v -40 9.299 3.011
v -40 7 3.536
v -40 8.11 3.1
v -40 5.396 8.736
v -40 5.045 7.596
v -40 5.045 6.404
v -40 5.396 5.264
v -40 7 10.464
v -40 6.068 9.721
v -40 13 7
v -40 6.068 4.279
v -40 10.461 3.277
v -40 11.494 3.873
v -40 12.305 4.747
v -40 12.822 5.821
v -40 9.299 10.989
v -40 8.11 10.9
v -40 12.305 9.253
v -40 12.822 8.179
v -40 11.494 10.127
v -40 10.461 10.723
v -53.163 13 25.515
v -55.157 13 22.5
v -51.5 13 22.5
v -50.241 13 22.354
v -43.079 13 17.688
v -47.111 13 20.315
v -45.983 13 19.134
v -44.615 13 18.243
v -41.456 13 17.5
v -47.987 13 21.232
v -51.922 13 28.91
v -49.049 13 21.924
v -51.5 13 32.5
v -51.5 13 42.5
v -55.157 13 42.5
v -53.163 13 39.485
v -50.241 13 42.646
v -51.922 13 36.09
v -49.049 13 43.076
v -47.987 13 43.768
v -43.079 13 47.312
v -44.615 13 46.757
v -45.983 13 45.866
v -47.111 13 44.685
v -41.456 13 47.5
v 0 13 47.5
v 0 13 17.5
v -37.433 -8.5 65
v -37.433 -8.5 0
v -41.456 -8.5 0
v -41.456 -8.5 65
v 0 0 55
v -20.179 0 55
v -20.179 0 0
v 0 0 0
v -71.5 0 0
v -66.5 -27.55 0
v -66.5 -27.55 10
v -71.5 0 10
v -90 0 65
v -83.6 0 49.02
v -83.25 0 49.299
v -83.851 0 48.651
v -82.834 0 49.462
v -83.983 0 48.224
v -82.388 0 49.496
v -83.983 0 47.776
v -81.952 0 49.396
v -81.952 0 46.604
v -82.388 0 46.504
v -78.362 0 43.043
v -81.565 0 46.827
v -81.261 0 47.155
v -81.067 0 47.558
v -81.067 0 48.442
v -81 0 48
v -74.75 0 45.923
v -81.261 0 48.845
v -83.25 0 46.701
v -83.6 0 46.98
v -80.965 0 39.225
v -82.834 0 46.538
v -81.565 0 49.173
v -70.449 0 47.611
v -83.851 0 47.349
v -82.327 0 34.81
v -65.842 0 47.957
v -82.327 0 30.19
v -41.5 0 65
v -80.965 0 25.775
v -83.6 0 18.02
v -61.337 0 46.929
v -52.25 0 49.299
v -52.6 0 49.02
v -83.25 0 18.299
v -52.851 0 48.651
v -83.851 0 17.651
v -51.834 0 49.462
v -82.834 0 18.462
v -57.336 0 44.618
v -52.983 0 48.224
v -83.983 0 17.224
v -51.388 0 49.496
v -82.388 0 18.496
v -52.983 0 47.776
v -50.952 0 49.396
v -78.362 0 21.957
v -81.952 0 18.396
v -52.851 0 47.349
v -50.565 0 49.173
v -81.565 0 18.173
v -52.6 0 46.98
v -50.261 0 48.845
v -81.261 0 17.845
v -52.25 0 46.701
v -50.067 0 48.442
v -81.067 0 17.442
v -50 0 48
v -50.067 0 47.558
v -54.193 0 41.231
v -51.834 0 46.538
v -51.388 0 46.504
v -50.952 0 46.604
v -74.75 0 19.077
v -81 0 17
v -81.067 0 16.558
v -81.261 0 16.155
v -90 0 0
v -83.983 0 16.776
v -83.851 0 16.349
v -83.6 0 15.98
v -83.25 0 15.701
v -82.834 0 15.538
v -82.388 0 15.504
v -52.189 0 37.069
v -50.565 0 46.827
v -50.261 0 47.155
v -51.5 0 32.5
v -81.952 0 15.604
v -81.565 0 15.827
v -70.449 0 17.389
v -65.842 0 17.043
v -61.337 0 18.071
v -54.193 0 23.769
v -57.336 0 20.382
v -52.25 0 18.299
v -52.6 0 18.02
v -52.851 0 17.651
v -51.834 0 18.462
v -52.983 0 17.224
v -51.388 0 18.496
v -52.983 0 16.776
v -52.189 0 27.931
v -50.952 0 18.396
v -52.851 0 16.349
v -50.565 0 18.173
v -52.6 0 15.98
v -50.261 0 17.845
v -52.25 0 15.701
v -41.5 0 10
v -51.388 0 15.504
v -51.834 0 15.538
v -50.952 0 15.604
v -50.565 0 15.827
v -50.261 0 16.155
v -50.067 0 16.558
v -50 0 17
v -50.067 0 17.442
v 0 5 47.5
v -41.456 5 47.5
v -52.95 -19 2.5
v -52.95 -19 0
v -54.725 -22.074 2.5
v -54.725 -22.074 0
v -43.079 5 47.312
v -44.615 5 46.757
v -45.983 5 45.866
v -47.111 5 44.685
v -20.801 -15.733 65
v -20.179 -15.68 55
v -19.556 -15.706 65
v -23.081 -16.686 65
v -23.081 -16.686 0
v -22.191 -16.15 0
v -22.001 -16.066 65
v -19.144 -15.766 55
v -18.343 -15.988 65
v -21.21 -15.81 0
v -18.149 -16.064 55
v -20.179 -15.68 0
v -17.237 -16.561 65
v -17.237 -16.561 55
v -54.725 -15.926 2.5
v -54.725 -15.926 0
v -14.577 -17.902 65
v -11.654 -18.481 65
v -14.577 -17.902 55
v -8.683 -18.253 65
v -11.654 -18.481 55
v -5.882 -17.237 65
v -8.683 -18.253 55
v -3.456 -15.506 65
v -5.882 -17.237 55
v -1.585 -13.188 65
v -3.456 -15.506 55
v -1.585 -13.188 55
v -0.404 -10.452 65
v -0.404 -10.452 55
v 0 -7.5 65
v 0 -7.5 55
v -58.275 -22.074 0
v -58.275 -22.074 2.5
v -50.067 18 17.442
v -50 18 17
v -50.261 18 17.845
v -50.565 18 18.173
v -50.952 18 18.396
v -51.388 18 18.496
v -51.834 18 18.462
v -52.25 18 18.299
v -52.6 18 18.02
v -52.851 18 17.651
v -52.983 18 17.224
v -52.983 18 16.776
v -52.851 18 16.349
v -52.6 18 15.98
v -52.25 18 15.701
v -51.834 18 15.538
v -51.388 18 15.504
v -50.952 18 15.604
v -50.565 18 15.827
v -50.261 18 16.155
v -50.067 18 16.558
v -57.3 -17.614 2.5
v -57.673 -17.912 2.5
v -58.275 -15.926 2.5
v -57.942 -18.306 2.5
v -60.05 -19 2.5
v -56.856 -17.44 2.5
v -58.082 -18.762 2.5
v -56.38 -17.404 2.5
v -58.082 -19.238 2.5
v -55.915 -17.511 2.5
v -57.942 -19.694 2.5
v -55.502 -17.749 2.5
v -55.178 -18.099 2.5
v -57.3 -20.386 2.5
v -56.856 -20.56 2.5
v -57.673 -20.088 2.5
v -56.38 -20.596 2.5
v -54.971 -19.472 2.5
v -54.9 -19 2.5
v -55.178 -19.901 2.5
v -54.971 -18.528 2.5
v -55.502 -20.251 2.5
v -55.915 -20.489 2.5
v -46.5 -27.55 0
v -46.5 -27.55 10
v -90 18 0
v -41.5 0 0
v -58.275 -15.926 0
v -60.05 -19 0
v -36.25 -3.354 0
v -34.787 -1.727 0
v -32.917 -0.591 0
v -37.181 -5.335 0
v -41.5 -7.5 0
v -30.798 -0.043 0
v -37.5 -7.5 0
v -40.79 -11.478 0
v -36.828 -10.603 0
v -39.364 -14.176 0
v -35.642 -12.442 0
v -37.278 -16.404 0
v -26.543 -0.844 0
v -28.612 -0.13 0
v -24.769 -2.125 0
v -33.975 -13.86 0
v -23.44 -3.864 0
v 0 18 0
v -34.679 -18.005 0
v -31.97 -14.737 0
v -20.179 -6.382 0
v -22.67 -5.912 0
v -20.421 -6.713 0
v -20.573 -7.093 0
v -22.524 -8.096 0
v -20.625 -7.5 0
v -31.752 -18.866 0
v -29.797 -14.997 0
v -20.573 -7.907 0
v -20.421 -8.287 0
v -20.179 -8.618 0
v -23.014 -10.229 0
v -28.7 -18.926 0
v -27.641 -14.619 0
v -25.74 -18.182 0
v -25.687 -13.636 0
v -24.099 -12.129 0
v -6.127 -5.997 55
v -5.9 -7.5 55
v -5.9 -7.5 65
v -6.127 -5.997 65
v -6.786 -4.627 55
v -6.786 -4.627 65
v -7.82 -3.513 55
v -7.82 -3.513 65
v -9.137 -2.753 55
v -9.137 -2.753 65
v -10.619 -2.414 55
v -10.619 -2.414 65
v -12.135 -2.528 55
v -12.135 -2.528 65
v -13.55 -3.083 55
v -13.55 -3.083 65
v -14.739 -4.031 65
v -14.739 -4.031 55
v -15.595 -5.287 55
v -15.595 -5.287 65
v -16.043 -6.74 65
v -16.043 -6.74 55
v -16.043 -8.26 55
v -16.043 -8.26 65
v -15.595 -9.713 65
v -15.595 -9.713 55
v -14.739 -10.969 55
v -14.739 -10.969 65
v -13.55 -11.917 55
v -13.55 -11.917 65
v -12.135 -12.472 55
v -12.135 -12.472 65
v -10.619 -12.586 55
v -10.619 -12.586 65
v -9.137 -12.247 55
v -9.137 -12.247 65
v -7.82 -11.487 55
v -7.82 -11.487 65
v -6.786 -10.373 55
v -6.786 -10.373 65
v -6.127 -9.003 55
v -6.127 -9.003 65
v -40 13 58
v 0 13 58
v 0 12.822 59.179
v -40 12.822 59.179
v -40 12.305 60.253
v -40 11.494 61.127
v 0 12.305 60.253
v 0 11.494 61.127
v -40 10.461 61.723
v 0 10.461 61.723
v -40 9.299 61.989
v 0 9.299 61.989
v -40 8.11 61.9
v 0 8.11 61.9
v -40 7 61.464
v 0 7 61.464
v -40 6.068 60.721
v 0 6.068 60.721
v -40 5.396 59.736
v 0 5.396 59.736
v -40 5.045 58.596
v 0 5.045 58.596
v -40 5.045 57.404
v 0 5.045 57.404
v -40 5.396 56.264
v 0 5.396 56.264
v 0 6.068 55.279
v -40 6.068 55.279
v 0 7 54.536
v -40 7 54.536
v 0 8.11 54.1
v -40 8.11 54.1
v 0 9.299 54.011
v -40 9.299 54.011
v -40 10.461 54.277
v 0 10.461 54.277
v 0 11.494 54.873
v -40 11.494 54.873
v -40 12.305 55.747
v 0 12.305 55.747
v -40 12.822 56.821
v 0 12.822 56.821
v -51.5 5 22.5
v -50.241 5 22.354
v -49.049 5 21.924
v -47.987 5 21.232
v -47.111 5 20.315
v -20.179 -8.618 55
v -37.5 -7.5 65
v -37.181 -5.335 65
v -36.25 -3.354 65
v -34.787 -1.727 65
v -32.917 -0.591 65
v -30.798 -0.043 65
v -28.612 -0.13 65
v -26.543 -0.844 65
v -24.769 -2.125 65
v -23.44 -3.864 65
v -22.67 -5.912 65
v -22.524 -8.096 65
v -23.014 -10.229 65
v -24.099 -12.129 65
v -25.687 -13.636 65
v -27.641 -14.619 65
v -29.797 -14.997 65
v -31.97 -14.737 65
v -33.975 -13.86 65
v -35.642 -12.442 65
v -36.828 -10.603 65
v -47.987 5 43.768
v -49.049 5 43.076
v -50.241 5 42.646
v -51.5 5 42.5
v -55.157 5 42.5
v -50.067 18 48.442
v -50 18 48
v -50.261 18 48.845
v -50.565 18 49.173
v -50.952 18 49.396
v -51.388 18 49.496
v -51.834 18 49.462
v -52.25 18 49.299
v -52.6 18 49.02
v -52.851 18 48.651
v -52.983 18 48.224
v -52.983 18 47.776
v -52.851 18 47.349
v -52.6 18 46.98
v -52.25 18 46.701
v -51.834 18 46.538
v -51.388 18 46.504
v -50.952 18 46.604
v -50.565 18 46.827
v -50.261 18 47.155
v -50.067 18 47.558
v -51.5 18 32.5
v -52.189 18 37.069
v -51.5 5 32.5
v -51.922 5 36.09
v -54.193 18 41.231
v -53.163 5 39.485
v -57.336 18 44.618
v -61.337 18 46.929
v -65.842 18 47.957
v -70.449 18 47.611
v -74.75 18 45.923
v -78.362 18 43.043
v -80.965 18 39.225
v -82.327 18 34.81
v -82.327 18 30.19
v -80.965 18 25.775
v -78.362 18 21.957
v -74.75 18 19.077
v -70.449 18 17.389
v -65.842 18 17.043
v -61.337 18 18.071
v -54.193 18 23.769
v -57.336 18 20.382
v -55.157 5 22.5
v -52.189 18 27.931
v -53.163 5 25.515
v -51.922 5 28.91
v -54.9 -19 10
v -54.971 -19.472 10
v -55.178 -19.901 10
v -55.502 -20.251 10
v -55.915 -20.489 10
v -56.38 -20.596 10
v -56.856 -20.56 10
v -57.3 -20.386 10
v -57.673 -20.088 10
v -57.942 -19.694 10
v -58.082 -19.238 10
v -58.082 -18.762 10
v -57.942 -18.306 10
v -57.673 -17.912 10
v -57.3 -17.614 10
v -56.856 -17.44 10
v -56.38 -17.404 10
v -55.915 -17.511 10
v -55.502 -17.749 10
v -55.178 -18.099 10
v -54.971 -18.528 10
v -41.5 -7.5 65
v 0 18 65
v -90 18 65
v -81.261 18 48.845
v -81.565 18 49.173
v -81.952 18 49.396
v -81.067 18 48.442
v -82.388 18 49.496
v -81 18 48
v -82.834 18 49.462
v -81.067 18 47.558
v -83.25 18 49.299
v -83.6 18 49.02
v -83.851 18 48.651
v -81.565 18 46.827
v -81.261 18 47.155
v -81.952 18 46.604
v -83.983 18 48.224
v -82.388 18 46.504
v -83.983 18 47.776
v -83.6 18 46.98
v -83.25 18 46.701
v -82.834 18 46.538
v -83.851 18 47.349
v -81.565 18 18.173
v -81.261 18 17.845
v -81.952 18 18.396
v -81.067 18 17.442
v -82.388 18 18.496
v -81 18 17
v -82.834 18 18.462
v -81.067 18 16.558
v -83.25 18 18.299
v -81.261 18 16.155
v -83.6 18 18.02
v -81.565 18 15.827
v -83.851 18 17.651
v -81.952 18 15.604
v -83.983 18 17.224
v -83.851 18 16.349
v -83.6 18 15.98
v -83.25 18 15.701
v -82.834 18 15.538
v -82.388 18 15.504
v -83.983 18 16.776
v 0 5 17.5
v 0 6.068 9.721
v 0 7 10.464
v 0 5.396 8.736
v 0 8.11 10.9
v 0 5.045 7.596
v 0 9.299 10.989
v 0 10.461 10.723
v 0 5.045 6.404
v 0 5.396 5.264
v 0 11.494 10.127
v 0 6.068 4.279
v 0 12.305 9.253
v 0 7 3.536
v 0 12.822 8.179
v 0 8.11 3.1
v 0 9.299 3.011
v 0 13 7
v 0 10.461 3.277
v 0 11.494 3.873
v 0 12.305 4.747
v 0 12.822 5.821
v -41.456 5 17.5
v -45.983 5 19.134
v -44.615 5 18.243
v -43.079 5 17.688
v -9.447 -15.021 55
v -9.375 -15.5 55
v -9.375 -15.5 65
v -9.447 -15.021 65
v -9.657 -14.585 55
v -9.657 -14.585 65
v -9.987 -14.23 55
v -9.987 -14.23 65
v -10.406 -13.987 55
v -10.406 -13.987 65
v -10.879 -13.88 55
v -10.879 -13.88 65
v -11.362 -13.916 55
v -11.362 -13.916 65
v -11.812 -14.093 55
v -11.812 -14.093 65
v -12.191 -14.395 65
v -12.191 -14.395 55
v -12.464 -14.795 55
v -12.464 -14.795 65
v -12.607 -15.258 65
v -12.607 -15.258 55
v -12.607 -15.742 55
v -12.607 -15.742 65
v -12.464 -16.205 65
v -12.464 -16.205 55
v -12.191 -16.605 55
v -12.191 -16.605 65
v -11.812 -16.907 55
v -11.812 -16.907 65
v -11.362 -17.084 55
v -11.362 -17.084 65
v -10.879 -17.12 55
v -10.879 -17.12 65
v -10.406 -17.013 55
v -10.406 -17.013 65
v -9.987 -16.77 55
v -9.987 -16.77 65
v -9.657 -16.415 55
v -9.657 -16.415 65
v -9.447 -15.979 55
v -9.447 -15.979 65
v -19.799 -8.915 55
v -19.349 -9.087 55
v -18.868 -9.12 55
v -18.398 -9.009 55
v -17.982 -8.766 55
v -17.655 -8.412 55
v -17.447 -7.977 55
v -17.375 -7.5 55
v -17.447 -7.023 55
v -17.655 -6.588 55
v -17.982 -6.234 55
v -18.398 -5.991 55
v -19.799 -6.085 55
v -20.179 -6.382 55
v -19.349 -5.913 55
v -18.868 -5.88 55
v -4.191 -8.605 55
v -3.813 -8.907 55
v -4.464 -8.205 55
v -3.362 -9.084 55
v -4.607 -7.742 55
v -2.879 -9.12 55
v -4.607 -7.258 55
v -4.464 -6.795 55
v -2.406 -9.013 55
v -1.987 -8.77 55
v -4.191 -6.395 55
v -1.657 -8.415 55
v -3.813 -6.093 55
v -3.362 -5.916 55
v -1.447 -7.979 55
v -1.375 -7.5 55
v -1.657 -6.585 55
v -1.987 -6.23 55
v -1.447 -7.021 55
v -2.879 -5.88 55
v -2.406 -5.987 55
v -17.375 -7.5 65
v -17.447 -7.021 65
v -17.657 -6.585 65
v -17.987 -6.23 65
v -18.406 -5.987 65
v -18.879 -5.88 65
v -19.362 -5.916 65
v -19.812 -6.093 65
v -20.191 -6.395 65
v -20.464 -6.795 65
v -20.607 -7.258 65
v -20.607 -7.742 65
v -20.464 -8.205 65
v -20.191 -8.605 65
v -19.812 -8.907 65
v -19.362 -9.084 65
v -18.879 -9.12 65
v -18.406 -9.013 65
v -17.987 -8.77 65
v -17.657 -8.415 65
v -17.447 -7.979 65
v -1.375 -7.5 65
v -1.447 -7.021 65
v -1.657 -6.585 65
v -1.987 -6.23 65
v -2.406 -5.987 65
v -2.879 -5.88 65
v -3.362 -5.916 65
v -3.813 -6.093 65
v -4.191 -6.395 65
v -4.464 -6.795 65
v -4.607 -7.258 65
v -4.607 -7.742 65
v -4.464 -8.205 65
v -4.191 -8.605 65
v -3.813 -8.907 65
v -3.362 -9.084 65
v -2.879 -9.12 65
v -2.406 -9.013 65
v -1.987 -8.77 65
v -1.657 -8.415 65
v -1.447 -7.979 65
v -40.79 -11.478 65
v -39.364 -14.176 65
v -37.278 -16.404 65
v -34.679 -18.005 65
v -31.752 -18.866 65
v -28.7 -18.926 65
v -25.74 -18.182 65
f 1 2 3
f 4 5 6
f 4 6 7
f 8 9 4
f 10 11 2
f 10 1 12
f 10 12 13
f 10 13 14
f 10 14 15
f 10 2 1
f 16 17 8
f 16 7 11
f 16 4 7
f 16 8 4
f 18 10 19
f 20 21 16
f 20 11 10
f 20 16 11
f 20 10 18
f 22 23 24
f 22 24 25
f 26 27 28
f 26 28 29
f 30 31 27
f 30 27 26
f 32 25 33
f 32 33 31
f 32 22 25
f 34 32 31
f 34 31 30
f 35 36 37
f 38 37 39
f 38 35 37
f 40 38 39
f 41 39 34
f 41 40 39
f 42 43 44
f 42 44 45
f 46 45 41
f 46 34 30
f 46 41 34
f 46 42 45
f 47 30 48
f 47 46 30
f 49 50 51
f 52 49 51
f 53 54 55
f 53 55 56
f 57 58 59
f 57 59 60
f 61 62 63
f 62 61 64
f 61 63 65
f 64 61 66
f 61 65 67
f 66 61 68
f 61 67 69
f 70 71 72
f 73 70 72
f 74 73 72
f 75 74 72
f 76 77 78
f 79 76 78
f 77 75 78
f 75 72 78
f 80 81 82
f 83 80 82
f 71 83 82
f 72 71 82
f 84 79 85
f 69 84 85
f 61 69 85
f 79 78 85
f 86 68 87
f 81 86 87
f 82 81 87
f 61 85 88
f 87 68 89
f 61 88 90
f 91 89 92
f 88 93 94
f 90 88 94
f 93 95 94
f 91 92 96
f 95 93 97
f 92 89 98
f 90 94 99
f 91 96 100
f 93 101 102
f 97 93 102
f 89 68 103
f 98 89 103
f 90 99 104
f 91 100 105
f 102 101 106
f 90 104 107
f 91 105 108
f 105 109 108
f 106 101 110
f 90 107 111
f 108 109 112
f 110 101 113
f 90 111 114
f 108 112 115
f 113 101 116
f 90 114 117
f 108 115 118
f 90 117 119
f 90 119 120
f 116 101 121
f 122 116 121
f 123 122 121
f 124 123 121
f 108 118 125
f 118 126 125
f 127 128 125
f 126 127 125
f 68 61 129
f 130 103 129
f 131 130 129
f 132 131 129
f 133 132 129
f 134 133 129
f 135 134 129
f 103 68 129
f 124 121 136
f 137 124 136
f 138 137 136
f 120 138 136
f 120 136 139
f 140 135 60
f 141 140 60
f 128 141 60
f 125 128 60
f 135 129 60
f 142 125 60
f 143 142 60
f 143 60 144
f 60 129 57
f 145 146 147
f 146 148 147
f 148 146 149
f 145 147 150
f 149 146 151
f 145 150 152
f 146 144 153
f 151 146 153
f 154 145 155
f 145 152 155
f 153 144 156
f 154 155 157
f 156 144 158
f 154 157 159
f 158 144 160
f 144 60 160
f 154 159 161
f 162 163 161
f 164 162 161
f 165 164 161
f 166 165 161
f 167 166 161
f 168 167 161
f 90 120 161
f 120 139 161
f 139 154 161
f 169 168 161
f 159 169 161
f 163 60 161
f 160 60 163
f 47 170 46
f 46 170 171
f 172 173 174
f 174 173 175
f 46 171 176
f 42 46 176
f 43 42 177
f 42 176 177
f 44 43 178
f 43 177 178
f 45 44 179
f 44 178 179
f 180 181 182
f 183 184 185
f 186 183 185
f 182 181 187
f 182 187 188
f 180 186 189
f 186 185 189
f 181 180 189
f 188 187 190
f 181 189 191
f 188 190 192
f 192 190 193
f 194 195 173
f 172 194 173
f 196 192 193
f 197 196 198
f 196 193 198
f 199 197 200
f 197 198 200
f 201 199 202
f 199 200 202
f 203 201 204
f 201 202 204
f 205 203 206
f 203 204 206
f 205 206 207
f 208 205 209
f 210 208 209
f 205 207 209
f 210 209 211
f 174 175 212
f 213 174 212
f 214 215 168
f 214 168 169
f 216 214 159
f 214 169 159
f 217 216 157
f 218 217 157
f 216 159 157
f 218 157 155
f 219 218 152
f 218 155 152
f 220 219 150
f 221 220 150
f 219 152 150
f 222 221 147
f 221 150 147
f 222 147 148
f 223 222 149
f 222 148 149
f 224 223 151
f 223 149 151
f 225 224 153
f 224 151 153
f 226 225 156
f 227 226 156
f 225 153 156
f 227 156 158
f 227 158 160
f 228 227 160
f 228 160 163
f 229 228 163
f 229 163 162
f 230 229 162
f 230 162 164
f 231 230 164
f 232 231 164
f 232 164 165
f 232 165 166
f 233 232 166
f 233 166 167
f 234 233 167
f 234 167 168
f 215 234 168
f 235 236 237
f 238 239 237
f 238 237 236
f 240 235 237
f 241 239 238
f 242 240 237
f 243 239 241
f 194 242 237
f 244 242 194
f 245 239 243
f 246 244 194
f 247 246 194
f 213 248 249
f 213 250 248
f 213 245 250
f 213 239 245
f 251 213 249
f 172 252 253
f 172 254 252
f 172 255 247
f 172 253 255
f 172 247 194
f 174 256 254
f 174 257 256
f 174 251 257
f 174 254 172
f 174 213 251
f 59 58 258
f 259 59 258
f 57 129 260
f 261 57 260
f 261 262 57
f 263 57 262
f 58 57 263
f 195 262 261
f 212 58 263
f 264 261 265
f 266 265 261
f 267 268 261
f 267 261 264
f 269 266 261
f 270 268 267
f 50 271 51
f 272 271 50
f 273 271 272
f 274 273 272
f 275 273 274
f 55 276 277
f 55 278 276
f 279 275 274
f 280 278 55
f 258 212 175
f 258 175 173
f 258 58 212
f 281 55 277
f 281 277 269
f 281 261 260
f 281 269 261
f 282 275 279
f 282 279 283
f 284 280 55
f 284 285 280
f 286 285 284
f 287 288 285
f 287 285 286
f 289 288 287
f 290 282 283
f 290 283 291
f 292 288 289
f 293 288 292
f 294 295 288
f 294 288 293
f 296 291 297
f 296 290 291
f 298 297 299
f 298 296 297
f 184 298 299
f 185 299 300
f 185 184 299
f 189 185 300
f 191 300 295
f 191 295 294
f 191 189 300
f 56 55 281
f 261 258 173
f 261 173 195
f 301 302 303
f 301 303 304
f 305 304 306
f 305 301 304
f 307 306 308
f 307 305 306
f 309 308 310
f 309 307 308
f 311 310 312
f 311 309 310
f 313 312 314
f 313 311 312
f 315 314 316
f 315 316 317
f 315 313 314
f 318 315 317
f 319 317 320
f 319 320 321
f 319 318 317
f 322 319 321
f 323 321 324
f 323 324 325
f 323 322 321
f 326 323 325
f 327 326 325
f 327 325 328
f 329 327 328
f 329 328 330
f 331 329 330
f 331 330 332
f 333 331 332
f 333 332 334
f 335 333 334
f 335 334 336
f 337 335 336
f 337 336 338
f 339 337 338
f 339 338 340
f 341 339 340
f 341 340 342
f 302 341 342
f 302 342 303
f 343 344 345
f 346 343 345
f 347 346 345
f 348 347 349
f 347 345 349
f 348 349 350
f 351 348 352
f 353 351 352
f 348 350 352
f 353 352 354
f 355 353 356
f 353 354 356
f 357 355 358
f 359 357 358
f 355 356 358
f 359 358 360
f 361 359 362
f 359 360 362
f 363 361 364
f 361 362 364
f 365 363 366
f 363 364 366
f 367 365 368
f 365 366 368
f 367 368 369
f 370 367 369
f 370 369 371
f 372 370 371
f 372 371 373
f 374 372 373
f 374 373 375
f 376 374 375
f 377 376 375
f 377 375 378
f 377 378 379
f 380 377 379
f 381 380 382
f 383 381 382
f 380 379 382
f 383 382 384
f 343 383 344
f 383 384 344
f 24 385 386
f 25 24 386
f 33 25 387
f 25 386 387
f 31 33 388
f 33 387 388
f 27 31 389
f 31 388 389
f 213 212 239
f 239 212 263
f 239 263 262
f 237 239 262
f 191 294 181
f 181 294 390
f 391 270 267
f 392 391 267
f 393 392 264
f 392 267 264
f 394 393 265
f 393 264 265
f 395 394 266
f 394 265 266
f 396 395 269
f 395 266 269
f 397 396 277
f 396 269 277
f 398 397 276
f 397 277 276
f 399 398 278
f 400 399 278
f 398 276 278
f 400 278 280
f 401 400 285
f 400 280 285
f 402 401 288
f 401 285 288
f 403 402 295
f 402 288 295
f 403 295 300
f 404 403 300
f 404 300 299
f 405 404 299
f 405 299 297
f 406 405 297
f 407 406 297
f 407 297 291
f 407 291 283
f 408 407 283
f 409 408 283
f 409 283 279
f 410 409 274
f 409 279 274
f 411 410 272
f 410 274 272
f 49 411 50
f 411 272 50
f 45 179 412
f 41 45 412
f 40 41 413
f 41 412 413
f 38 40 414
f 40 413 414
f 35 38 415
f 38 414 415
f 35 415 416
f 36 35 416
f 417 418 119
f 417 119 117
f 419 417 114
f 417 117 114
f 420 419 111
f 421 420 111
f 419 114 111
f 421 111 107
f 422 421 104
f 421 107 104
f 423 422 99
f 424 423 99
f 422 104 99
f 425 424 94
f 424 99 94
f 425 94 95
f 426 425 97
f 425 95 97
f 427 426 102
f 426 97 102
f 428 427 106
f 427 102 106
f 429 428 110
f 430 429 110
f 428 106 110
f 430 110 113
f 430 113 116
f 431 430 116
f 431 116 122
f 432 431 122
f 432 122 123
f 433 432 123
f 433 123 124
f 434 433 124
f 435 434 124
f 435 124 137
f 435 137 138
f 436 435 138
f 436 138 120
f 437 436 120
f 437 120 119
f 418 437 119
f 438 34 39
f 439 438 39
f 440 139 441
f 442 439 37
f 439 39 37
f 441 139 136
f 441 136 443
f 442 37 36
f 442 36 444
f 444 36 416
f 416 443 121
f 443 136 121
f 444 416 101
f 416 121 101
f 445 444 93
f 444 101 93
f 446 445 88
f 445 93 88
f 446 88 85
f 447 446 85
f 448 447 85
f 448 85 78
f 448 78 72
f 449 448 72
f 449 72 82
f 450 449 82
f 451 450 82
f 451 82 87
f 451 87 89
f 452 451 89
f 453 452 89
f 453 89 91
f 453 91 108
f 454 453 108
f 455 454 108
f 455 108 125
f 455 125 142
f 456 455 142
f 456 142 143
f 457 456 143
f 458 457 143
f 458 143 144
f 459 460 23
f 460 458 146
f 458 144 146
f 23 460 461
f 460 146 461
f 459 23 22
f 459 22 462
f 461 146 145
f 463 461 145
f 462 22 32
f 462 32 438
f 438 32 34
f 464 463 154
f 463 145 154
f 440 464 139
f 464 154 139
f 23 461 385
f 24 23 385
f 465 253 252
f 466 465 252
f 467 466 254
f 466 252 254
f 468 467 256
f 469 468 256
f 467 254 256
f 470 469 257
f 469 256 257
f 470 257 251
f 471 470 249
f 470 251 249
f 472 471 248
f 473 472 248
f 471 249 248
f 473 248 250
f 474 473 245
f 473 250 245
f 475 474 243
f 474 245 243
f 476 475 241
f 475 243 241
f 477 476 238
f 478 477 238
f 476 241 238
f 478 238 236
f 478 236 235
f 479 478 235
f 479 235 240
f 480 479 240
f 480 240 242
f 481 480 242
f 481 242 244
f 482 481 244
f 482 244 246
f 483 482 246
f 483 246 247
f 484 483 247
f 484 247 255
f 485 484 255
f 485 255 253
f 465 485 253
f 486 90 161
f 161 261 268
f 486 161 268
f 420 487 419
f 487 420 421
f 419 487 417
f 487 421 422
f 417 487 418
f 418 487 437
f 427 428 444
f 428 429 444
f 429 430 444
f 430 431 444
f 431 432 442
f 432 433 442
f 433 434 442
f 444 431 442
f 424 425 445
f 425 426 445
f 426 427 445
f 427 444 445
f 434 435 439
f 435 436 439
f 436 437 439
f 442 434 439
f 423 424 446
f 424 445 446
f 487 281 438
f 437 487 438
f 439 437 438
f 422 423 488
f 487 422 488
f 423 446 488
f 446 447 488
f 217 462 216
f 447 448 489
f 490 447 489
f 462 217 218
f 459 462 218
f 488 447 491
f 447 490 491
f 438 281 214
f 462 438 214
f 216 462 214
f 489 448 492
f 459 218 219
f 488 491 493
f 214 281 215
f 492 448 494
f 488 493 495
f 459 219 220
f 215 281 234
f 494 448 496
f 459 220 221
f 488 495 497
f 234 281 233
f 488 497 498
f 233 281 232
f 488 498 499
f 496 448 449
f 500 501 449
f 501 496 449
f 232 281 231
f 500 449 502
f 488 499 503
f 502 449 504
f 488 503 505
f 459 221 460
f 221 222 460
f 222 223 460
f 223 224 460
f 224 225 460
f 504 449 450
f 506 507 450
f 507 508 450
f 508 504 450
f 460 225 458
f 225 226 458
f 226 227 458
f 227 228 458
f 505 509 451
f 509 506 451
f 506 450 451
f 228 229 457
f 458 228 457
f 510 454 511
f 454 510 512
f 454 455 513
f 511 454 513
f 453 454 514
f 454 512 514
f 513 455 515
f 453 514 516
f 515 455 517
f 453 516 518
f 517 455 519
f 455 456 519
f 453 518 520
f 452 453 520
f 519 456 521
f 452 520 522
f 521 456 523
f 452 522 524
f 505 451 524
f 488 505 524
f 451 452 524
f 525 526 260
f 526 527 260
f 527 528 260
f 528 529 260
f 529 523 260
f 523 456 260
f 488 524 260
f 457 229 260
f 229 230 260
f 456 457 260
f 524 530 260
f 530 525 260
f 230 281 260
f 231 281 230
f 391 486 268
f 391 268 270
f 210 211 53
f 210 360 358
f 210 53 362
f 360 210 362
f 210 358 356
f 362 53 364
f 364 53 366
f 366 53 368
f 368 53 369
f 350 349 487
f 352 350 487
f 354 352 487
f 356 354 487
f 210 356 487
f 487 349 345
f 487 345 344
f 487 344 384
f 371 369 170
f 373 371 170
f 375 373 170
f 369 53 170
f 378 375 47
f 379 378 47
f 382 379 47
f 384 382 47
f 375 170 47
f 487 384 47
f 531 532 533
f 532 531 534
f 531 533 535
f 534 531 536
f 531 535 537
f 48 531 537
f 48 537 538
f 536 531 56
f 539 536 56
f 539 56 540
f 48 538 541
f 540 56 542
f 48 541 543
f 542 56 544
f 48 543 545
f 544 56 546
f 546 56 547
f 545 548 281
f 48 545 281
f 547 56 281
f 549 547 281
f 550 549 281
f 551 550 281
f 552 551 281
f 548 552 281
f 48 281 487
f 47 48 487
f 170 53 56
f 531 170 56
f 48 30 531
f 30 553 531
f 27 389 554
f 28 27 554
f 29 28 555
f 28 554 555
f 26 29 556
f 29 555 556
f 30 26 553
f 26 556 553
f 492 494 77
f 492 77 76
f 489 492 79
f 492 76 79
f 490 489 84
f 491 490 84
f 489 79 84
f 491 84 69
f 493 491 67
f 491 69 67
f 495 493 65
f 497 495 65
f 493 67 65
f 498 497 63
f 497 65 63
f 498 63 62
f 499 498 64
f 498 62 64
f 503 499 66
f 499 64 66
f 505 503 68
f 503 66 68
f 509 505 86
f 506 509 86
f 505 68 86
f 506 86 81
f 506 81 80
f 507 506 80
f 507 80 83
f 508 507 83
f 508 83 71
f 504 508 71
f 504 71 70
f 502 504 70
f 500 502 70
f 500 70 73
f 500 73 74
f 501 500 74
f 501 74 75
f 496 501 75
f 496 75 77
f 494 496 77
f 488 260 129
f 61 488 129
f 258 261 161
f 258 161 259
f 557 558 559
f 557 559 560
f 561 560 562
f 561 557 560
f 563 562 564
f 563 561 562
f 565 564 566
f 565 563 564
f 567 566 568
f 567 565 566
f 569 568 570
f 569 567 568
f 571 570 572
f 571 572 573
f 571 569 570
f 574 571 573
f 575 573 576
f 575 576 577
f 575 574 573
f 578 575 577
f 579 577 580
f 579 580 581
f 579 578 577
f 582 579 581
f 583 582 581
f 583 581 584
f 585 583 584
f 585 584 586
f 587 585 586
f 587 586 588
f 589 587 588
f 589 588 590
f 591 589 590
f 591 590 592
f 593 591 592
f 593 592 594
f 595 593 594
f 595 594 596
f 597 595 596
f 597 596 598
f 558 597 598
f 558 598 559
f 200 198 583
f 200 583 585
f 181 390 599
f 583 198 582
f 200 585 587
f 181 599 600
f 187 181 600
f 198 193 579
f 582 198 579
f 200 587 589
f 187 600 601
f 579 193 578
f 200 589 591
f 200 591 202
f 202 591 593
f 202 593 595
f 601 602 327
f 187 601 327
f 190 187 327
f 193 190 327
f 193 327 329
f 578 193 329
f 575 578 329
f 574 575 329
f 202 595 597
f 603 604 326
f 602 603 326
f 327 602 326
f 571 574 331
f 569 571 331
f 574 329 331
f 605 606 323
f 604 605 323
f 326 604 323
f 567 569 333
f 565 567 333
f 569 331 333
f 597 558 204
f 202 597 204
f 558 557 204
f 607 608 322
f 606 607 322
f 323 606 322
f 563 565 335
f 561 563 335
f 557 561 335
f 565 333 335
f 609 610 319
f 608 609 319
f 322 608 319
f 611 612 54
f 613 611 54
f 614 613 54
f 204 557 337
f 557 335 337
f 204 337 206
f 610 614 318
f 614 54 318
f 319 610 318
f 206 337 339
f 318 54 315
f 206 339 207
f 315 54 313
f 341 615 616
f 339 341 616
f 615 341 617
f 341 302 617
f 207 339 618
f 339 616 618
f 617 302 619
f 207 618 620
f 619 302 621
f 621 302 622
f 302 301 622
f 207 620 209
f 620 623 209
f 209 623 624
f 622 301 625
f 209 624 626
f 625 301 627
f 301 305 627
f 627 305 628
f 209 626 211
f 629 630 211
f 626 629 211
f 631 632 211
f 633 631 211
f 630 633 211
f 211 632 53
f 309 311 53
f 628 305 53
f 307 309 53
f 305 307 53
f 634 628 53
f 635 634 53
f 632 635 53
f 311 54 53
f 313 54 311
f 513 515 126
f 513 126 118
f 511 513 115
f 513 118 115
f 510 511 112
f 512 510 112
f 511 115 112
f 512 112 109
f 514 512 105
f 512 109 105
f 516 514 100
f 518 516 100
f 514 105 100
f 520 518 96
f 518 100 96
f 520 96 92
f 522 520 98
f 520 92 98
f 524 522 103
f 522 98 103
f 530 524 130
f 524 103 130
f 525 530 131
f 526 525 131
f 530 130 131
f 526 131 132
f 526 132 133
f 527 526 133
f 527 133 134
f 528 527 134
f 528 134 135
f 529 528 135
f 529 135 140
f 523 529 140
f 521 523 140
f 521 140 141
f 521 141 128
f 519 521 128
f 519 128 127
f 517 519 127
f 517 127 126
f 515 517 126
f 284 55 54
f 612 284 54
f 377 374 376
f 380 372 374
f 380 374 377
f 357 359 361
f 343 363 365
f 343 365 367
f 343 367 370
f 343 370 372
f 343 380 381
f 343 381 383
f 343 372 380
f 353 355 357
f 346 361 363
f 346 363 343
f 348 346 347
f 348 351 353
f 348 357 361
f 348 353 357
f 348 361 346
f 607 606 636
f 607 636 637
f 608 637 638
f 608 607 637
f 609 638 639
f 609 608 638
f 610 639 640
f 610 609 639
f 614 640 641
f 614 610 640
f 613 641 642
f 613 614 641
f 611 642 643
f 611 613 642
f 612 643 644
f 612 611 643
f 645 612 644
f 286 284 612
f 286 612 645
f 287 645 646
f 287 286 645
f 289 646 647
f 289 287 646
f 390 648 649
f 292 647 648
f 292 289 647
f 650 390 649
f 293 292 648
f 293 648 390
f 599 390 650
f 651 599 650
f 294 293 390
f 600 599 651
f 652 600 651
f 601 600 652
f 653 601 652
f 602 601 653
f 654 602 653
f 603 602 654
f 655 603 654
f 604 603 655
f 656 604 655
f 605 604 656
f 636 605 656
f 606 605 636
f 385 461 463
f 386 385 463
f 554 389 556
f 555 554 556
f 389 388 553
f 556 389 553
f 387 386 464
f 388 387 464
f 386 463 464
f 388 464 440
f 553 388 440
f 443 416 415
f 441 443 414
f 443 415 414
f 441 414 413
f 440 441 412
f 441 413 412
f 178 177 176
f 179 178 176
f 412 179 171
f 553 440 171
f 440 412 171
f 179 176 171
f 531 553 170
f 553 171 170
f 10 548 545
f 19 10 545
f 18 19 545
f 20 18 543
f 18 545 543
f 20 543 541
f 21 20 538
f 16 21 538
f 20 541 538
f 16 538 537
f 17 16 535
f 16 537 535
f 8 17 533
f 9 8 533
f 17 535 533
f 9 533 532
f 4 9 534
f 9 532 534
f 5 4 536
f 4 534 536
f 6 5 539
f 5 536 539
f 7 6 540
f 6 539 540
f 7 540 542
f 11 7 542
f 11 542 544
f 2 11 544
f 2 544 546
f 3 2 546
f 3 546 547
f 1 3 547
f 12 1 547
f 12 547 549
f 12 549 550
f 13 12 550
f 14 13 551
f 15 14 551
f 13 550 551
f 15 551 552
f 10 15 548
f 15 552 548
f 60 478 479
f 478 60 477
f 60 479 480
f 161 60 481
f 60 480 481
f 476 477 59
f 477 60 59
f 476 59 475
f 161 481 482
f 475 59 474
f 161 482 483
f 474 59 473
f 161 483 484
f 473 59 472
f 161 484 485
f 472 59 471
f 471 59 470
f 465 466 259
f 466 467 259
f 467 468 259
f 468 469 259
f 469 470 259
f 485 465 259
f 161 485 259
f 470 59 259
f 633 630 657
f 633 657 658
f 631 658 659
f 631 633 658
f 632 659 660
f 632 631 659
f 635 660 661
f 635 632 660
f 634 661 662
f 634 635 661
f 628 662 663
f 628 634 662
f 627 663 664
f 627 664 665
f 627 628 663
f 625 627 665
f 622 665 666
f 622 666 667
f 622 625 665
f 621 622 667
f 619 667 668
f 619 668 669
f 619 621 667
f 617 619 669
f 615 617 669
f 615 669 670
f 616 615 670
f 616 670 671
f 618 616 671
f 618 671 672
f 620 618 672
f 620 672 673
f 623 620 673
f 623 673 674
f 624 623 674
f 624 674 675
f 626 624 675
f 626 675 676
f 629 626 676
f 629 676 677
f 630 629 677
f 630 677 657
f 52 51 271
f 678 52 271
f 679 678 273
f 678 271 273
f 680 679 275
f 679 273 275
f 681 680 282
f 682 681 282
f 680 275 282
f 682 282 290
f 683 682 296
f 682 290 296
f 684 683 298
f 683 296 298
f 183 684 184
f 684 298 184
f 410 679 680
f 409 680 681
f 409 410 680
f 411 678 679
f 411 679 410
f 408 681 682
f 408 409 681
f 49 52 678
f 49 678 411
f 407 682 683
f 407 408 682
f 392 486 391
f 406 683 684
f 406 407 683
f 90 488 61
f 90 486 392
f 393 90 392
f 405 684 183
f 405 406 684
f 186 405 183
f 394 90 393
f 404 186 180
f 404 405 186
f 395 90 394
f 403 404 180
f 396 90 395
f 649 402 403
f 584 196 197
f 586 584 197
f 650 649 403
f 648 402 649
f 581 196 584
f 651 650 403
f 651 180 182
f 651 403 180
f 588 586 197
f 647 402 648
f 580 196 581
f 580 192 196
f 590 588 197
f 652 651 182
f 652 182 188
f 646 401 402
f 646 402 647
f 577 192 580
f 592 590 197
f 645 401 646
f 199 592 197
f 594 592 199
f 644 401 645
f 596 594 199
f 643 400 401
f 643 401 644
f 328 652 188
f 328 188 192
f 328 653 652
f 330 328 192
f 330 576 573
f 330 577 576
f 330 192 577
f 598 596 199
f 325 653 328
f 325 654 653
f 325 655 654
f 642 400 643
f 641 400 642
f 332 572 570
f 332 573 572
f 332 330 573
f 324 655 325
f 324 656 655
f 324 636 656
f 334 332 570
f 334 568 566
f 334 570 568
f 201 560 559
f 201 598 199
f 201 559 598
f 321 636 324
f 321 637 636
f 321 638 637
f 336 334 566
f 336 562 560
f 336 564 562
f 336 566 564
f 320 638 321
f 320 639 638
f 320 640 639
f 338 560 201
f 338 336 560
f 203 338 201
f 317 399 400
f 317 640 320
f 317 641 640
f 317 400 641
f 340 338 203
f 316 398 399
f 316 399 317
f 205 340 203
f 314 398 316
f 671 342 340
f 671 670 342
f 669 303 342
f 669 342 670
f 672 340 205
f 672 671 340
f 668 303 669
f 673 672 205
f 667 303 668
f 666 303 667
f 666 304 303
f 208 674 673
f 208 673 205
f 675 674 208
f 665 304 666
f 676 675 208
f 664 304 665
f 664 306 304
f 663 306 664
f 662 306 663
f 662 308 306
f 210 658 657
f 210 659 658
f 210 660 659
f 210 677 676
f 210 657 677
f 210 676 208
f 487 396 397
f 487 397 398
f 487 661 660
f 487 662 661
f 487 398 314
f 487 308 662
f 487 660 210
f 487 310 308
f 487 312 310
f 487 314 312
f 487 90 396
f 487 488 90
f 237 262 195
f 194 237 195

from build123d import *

# Parameters (mm, degrees)
F0_R      = 1.625
F0_R_2    = 5.1
F1_DEPTH  = 65
F2_W      = 20.1791324483
F2_H      = 55
F3_DEPTH  = 19.001
F4_R      = 15.5
F4_R_2    = 1.5
F5_DEPTH  = 18.001
F6_R      = 4
F7_DEPTH  = 40
F13_DEPTH = 4
F14_W     = 20
F14_H     = 27.55
F15_DEPTH = 10
F16_DEPTH = 2.5
F17_R     = 1.6
F18_DEPTH = 62.501


with BuildPart() as f1:
    # F0 (on Top) → F1 (new body)
    with BuildSketch(Plane.XY):
        with BuildLine():
            Line((0, 0), (0, 18))
            Line((0, 18), (-90, 18))
            Line((-90, 18), (-90, 0))
            Line((-90, 0), (-41.5, 0))
            Line((-41.5, 0), (-41.5, -7.5))
            Line((-41.5, -7.5), (-37.5, -7.5))
            ThreePointArc((-37.5, -7.5), (-22.5167601334, -6.9988801553), (-37.4330343737, -8.5))
            Line((-37.4330343737, -8.5), (-41.4564392374, -8.5))
            ThreePointArc((-41.4564392374, -8.5), (-34.6794450635, -18.0048938071), (-23.0807416268, -16.6855246755))
            ThreePointArc((-23.0807416268, -16.6855246755), (-20.1791324483, -15.6803710419), (-17.2372532895, -16.5607213511))
            ThreePointArc((-17.2372532895, -16.5607213511), (-5.8818844378, -17.2367804274), (0, -7.5))
            Line((0, -7.5), (0, 0))
        make_face()
        with Locations((-11, -15.5)):
            Circle(F0_R, mode=Mode.SUBTRACT)
        with Locations((-19, -7.5)):
            Circle(F0_R, mode=Mode.SUBTRACT)
        with Locations((-11, -7.5)):
            Circle(F0_R_2, mode=Mode.SUBTRACT)
        with Locations((-3, -7.5)):
            Circle(F0_R, mode=Mode.SUBTRACT)
    extrude(amount=F1_DEPTH)

    # F2 (on face) → F3 (cut, through all)
    with BuildSketch(Plane.XZ):
        with Locations((-10.0895662241, 27.5)):
            Rectangle(F2_W, F2_H)
    extrude(amount=F3_DEPTH, mode=Mode.SUBTRACT)

    # F4 (on face) → F5 (cut, through all)
    with BuildSketch(Plane.XZ):
        with Locations((-67, 32.5)):
            Circle(F4_R)
        with Locations((-82.5, 17)):
            Circle(F4_R_2)
        with Locations((-51.5, 17)):
            Circle(F4_R_2)
        with Locations((-51.5, 48)):
            Circle(F4_R_2)
        with Locations((-82.5, 48)):
            Circle(F4_R_2)
    extrude(amount=-F5_DEPTH, mode=Mode.SUBTRACT)

    # F6 (on face) → F7 (cut)
    with BuildSketch(Plane.YZ):
        with Locations((9, 58)):
            Circle(F6_R)
        with Locations((9, 7)):
            Circle(F6_R)
    extrude(amount=-F7_DEPTH, mode=Mode.SUBTRACT)

    # F12 (on 3pt) → F13 (cut, symmetric)
    with BuildSketch(Plane.XZ.offset(-9)):
        with BuildLine():
            Line((-67, 32.5), (0, 32.5))
            Line((0, 32.5), (0, 47.5))
            Line((0, 47.5), (-41.4564392374, 47.5))
            ThreePointArc((-41.4564392374, 47.5), (-44.6149693804, 46.7572666031), (-47.1114866019, 44.6847398058))
            ThreePointArc((-47.1114866019, 44.6847398058), (-49.0488707774, 43.0763869431), (-51.5, 42.5))
            Line((-51.5, 42.5), (-67, 42.5))
            Line((-67, 42.5), (-67, 32.5))
        make_face()
        with BuildLine():
            Line((0, 17.5), (0, 32.5))
            Line((0, 32.5), (-67, 32.5))
            Line((-67, 32.5), (-67, 22.5))
            Line((-67, 22.5), (-51.5, 22.5))
            ThreePointArc((-51.5, 22.5), (-49.0488707774, 21.9236130569), (-47.1114866019, 20.3152601942))
            ThreePointArc((-47.1114866019, 20.3152601942), (-44.6149693804, 18.2427333969), (-41.4564392374, 17.5))
            Line((-41.4564392374, 17.5), (0, 17.5))
        make_face()
    extrude(amount=F13_DEPTH, both=True, mode=Mode.SUBTRACT)

    # F14 (on face) → F15 (join)
    with BuildSketch(Plane(origin=(0, 0, 0), x_dir=(1, 0, 0), z_dir=(0, 0, -1))):
        with Locations((-56.5, 13.775)):
            Rectangle(F14_W, F14_H)
        Polygon((-52.95, 19), (-54.725, 15.9256098166), (-58.275, 15.9256098166), (-60.05, 19), (-58.275, 22.0743901834), (-54.725, 22.0743901834), align=None, mode=Mode.SUBTRACT)
        Polygon((-71.5, 0), (-66.5, 0), (-66.5, 27.55), align=None)
        Polygon((-46.5, 27.55), (-46.5, 0), (-41.5, 0), align=None)
        Polygon((-58.275, 15.9256098166), (-54.725, 15.9256098166), (-52.95, 19), (-54.725, 22.0743901834), (-58.275, 22.0743901834), (-60.05, 19), align=None)
    extrude(amount=-F15_DEPTH)

    # F14 (on face) → F16 (cut)
    with BuildSketch(Plane(origin=(0, 0, 0), x_dir=(1, 0, 0), z_dir=(0, 0, -1))):
        Polygon((-58.275, 15.9256098166), (-54.725, 15.9256098166), (-52.95, 19), (-54.725, 22.0743901834), (-58.275, 22.0743901834), (-60.05, 19), align=None)
    extrude(amount=-F16_DEPTH, mode=Mode.SUBTRACT)

    # F17 (on face) → F18 (cut, through all)
    with BuildSketch(Plane(origin=(0, 0, 2.5), x_dir=(1, 0, 0), z_dir=(0, 0, -1))):
        with Locations((-56.5, 19)):
            Circle(F17_R)
    extrude(amount=-F18_DEPTH, mode=Mode.SUBTRACT)


solid = f1.part
